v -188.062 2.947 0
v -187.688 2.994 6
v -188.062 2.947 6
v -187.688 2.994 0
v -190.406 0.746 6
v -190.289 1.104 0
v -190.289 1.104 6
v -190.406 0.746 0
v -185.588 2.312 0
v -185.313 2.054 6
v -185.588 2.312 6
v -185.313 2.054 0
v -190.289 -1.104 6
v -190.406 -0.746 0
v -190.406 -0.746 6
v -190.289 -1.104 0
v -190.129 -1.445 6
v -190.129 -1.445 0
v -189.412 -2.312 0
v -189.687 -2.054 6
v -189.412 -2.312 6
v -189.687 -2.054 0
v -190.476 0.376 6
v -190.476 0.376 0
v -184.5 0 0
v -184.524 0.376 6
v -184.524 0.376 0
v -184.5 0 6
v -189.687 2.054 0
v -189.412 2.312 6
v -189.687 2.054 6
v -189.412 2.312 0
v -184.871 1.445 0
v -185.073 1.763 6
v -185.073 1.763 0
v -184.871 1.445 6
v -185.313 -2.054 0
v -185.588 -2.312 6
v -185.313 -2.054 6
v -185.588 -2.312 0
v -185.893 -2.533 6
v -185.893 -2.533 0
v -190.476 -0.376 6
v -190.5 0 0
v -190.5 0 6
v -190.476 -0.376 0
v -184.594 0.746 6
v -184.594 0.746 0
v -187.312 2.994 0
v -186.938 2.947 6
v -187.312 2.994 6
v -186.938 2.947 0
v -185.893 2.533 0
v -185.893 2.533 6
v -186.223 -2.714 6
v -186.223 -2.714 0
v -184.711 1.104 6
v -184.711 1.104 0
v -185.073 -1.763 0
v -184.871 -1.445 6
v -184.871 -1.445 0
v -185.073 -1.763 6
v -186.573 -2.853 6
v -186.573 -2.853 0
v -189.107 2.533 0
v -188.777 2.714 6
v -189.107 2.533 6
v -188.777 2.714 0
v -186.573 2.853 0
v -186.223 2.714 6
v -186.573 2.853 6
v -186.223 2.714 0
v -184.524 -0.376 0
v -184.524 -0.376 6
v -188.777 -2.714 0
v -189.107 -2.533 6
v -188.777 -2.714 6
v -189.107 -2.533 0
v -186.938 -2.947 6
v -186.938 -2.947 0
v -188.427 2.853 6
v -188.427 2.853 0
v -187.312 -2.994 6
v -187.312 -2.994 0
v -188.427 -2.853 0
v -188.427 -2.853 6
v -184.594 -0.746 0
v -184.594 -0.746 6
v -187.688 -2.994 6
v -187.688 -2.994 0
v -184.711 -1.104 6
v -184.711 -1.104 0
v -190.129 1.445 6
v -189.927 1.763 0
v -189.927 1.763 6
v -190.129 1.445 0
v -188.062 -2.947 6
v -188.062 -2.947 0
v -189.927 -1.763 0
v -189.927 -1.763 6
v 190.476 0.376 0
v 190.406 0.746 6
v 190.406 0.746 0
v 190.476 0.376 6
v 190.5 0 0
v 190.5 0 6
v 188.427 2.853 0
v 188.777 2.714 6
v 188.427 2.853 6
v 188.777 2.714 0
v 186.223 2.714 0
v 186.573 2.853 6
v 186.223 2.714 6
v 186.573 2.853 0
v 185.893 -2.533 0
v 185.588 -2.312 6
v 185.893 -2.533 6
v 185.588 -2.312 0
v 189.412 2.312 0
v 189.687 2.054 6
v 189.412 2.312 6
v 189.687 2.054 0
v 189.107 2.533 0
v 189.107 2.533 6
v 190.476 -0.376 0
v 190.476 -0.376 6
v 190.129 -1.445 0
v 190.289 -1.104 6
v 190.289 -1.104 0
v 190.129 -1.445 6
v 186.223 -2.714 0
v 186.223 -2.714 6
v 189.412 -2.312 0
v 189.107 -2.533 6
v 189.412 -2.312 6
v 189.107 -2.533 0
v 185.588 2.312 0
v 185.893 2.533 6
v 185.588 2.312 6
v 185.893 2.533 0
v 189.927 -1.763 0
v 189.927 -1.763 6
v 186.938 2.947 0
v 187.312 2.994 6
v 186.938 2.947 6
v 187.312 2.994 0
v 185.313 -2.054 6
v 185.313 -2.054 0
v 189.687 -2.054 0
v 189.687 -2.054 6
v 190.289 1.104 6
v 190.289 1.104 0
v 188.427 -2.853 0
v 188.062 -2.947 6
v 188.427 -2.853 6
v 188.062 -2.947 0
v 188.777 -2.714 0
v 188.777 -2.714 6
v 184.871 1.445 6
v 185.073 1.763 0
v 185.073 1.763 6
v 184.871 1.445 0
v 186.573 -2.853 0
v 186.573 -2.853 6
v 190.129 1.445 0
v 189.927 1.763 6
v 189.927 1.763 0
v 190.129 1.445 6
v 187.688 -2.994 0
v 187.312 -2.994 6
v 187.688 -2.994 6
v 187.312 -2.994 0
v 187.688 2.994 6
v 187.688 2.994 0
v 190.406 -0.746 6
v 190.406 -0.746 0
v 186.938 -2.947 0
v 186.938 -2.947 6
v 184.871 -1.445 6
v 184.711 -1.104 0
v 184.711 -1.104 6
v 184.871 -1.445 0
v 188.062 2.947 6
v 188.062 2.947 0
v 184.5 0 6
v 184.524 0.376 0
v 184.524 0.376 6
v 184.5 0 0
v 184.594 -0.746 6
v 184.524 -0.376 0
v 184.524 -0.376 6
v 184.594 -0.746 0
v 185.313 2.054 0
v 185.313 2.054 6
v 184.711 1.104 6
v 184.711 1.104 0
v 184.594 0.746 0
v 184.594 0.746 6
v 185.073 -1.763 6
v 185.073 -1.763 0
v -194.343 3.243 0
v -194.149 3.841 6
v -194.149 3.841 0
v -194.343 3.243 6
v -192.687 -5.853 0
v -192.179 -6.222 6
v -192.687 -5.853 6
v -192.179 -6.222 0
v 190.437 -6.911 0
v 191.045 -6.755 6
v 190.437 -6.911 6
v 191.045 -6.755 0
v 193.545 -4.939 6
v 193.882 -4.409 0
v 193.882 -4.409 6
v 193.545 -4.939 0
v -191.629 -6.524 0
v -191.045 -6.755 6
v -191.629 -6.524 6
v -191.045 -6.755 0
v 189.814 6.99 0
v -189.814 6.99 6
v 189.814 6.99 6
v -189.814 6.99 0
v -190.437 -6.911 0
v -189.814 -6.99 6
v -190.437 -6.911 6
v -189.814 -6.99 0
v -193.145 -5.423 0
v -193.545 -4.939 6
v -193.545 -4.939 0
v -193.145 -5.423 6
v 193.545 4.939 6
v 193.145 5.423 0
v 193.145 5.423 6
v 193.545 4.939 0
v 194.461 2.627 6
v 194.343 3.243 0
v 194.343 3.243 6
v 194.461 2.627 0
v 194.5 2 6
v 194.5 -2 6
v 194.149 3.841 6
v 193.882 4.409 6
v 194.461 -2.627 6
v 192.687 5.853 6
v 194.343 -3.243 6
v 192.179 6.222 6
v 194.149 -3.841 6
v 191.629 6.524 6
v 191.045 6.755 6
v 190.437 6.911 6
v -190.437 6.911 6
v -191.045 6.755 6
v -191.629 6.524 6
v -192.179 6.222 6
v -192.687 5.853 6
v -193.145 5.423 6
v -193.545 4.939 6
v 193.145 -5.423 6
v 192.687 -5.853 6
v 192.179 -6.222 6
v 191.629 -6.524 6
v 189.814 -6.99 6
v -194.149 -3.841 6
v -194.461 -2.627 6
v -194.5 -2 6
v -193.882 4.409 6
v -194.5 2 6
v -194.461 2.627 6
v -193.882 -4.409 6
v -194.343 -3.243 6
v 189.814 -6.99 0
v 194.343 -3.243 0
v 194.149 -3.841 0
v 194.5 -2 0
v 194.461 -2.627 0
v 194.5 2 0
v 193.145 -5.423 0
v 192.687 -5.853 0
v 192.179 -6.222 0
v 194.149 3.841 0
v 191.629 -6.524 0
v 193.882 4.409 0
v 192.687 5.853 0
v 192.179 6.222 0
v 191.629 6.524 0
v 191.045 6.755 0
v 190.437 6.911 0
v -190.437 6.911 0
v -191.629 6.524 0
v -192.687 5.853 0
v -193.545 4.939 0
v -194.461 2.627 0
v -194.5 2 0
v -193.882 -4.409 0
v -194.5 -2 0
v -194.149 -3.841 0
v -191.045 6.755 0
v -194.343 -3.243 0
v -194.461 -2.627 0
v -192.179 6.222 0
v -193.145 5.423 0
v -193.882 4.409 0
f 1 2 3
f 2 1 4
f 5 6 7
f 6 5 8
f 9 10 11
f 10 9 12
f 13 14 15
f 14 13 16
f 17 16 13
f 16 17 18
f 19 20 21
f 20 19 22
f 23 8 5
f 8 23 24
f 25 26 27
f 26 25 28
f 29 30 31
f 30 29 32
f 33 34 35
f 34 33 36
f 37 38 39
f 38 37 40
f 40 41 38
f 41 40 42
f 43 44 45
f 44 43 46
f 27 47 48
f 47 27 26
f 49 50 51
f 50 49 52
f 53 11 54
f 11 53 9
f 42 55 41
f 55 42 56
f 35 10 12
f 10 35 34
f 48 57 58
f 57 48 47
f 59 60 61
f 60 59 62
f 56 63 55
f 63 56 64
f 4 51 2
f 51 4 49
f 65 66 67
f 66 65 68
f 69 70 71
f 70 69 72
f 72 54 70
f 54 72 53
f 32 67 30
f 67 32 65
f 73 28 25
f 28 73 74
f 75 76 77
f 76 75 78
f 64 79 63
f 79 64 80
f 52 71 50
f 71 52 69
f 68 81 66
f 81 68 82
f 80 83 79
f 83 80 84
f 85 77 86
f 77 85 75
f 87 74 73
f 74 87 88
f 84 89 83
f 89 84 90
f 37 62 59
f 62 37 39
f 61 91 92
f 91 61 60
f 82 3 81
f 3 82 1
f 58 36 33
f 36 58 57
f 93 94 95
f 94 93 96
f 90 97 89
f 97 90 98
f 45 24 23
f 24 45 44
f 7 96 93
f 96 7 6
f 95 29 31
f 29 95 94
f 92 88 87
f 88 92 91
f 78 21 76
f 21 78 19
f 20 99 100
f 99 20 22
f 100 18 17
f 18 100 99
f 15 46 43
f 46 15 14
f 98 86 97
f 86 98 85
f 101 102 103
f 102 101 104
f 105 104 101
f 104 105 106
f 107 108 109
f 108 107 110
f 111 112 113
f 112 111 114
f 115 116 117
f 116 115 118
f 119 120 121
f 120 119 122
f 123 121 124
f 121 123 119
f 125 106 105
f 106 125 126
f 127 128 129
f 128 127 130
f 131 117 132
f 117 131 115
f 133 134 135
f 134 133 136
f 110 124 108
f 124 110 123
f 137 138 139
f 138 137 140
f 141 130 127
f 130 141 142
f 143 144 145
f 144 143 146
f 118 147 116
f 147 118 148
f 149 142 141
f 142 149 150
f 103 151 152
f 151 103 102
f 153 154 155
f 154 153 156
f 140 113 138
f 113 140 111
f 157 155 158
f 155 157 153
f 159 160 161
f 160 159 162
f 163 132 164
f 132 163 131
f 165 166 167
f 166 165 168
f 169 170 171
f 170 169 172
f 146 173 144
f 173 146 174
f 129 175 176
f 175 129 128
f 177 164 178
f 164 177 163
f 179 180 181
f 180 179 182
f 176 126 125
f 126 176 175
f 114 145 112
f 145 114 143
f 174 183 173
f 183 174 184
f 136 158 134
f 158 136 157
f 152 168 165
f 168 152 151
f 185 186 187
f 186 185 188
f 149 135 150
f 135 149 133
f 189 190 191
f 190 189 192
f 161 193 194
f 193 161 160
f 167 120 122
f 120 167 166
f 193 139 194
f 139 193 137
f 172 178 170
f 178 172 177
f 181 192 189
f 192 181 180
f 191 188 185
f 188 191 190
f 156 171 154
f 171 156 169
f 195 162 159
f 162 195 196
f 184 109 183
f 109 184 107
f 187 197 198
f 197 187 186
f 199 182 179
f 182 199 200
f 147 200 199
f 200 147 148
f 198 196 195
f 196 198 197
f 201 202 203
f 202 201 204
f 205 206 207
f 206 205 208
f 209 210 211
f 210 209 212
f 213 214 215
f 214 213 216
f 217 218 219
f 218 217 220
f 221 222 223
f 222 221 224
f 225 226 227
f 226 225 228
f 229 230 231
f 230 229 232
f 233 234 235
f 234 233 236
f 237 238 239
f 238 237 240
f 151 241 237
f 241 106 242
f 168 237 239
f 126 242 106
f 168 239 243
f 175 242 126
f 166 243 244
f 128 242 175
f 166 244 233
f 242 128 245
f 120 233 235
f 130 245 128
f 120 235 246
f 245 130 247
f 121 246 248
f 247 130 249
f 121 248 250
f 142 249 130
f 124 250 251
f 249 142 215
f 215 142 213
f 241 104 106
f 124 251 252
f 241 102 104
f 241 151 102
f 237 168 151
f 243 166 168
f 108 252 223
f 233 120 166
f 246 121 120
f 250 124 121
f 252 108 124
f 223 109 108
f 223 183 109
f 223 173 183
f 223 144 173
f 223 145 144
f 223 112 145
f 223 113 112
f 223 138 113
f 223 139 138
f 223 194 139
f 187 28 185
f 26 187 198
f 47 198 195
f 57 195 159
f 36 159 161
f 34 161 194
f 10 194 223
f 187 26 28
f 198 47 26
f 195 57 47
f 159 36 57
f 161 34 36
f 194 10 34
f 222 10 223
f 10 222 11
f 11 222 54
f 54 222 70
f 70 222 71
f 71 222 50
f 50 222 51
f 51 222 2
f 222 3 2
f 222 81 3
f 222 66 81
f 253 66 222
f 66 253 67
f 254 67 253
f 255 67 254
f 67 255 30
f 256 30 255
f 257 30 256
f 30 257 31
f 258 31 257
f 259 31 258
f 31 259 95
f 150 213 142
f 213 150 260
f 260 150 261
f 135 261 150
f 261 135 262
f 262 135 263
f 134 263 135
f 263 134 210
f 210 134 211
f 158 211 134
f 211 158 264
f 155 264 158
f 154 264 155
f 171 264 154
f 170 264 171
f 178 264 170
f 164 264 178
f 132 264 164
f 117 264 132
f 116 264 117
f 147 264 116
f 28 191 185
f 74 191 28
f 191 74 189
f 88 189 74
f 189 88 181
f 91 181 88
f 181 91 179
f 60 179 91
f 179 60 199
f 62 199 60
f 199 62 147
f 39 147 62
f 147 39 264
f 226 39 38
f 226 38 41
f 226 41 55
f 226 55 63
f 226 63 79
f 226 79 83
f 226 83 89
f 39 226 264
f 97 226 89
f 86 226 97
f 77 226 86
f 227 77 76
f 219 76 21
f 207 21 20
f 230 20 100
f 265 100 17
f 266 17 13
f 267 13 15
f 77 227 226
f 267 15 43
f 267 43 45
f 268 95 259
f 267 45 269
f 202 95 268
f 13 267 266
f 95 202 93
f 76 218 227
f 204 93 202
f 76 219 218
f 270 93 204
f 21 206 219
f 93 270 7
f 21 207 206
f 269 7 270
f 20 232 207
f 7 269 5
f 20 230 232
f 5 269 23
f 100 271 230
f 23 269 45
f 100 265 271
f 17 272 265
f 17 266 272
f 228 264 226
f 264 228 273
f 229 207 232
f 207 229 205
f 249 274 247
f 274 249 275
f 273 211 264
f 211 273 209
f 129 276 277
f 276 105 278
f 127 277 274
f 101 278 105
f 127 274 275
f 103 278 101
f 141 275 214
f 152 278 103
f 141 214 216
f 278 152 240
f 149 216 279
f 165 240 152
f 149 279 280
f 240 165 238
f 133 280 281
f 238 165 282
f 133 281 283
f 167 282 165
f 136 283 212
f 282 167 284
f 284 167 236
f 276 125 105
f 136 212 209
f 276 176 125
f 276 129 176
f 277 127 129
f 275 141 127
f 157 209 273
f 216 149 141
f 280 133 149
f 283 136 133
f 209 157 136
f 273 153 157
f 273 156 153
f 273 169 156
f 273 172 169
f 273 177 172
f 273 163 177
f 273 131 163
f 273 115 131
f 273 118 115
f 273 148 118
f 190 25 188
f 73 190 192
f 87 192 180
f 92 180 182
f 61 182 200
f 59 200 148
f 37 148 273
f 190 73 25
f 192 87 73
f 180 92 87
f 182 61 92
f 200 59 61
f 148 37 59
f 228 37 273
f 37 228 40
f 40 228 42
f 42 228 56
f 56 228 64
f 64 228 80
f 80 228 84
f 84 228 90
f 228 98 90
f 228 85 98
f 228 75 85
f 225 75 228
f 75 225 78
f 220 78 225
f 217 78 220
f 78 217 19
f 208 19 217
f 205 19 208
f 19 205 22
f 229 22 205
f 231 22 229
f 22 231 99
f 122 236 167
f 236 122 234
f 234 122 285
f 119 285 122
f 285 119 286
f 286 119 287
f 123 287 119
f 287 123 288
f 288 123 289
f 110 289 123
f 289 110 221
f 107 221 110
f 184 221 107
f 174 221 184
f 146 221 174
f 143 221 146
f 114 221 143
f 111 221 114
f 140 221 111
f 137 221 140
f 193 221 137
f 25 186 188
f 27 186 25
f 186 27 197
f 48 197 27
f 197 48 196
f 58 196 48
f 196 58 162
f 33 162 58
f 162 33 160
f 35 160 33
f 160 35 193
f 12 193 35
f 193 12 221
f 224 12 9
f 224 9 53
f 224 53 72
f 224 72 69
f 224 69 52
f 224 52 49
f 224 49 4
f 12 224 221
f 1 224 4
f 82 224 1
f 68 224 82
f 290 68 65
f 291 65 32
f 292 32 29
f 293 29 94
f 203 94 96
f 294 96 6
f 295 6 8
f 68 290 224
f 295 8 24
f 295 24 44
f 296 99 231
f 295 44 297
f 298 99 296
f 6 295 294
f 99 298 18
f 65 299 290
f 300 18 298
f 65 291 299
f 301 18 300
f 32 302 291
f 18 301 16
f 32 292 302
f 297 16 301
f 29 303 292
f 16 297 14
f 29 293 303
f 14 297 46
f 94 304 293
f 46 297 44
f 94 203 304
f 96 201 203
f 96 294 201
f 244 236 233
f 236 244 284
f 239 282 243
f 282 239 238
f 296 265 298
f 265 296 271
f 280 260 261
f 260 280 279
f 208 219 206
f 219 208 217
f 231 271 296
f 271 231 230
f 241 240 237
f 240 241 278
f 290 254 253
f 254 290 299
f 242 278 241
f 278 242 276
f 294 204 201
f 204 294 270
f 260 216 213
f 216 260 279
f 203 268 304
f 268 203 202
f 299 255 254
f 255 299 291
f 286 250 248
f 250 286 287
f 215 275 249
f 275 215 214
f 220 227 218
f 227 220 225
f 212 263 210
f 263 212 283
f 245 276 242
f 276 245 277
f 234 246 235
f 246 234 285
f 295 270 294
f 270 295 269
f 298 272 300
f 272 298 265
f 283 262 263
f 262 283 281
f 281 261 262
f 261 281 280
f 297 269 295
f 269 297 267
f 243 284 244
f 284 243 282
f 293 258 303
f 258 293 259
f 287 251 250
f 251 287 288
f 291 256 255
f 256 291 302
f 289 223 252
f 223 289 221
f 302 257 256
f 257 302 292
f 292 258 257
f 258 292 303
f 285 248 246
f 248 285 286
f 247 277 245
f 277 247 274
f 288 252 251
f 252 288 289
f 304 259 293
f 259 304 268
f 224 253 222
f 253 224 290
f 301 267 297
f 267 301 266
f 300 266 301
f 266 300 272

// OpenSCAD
$fn = 50;


difference() {
	union() {
		hull() {
			translate(v = [-189.5000000000, 2.0000000000, 0]) {
				cylinder(h = 6, r = 5);
			}
			translate(v = [189.5000000000, 2.0000000000, 0]) {
				cylinder(h = 6, r = 5);
			}
			translate(v = [-189.5000000000, -2.0000000000, 0]) {
				cylinder(h = 6, r = 5);
			}
			translate(v = [189.5000000000, -2.0000000000, 0]) {
				cylinder(h = 6, r = 5);
			}
		}
	}
	union() {
		translate(v = [-187.5000000000, 0.0000000000, -100.0000000000]) {
			cylinder(h = 200, r = 3.0000000000);
		}
		translate(v = [-187.5000000000, 0.0000000000, -100.0000000000]) {
			cylinder(h = 200, r = 3.0000000000);
		}
		translate(v = [187.5000000000, 0.0000000000, -100.0000000000]) {
			cylinder(h = 200, r = 3.0000000000);
		}
		translate(v = [187.5000000000, 0.0000000000, -100.0000000000]) {
			cylinder(h = 200, r = 3.0000000000);
		}
	}
}
